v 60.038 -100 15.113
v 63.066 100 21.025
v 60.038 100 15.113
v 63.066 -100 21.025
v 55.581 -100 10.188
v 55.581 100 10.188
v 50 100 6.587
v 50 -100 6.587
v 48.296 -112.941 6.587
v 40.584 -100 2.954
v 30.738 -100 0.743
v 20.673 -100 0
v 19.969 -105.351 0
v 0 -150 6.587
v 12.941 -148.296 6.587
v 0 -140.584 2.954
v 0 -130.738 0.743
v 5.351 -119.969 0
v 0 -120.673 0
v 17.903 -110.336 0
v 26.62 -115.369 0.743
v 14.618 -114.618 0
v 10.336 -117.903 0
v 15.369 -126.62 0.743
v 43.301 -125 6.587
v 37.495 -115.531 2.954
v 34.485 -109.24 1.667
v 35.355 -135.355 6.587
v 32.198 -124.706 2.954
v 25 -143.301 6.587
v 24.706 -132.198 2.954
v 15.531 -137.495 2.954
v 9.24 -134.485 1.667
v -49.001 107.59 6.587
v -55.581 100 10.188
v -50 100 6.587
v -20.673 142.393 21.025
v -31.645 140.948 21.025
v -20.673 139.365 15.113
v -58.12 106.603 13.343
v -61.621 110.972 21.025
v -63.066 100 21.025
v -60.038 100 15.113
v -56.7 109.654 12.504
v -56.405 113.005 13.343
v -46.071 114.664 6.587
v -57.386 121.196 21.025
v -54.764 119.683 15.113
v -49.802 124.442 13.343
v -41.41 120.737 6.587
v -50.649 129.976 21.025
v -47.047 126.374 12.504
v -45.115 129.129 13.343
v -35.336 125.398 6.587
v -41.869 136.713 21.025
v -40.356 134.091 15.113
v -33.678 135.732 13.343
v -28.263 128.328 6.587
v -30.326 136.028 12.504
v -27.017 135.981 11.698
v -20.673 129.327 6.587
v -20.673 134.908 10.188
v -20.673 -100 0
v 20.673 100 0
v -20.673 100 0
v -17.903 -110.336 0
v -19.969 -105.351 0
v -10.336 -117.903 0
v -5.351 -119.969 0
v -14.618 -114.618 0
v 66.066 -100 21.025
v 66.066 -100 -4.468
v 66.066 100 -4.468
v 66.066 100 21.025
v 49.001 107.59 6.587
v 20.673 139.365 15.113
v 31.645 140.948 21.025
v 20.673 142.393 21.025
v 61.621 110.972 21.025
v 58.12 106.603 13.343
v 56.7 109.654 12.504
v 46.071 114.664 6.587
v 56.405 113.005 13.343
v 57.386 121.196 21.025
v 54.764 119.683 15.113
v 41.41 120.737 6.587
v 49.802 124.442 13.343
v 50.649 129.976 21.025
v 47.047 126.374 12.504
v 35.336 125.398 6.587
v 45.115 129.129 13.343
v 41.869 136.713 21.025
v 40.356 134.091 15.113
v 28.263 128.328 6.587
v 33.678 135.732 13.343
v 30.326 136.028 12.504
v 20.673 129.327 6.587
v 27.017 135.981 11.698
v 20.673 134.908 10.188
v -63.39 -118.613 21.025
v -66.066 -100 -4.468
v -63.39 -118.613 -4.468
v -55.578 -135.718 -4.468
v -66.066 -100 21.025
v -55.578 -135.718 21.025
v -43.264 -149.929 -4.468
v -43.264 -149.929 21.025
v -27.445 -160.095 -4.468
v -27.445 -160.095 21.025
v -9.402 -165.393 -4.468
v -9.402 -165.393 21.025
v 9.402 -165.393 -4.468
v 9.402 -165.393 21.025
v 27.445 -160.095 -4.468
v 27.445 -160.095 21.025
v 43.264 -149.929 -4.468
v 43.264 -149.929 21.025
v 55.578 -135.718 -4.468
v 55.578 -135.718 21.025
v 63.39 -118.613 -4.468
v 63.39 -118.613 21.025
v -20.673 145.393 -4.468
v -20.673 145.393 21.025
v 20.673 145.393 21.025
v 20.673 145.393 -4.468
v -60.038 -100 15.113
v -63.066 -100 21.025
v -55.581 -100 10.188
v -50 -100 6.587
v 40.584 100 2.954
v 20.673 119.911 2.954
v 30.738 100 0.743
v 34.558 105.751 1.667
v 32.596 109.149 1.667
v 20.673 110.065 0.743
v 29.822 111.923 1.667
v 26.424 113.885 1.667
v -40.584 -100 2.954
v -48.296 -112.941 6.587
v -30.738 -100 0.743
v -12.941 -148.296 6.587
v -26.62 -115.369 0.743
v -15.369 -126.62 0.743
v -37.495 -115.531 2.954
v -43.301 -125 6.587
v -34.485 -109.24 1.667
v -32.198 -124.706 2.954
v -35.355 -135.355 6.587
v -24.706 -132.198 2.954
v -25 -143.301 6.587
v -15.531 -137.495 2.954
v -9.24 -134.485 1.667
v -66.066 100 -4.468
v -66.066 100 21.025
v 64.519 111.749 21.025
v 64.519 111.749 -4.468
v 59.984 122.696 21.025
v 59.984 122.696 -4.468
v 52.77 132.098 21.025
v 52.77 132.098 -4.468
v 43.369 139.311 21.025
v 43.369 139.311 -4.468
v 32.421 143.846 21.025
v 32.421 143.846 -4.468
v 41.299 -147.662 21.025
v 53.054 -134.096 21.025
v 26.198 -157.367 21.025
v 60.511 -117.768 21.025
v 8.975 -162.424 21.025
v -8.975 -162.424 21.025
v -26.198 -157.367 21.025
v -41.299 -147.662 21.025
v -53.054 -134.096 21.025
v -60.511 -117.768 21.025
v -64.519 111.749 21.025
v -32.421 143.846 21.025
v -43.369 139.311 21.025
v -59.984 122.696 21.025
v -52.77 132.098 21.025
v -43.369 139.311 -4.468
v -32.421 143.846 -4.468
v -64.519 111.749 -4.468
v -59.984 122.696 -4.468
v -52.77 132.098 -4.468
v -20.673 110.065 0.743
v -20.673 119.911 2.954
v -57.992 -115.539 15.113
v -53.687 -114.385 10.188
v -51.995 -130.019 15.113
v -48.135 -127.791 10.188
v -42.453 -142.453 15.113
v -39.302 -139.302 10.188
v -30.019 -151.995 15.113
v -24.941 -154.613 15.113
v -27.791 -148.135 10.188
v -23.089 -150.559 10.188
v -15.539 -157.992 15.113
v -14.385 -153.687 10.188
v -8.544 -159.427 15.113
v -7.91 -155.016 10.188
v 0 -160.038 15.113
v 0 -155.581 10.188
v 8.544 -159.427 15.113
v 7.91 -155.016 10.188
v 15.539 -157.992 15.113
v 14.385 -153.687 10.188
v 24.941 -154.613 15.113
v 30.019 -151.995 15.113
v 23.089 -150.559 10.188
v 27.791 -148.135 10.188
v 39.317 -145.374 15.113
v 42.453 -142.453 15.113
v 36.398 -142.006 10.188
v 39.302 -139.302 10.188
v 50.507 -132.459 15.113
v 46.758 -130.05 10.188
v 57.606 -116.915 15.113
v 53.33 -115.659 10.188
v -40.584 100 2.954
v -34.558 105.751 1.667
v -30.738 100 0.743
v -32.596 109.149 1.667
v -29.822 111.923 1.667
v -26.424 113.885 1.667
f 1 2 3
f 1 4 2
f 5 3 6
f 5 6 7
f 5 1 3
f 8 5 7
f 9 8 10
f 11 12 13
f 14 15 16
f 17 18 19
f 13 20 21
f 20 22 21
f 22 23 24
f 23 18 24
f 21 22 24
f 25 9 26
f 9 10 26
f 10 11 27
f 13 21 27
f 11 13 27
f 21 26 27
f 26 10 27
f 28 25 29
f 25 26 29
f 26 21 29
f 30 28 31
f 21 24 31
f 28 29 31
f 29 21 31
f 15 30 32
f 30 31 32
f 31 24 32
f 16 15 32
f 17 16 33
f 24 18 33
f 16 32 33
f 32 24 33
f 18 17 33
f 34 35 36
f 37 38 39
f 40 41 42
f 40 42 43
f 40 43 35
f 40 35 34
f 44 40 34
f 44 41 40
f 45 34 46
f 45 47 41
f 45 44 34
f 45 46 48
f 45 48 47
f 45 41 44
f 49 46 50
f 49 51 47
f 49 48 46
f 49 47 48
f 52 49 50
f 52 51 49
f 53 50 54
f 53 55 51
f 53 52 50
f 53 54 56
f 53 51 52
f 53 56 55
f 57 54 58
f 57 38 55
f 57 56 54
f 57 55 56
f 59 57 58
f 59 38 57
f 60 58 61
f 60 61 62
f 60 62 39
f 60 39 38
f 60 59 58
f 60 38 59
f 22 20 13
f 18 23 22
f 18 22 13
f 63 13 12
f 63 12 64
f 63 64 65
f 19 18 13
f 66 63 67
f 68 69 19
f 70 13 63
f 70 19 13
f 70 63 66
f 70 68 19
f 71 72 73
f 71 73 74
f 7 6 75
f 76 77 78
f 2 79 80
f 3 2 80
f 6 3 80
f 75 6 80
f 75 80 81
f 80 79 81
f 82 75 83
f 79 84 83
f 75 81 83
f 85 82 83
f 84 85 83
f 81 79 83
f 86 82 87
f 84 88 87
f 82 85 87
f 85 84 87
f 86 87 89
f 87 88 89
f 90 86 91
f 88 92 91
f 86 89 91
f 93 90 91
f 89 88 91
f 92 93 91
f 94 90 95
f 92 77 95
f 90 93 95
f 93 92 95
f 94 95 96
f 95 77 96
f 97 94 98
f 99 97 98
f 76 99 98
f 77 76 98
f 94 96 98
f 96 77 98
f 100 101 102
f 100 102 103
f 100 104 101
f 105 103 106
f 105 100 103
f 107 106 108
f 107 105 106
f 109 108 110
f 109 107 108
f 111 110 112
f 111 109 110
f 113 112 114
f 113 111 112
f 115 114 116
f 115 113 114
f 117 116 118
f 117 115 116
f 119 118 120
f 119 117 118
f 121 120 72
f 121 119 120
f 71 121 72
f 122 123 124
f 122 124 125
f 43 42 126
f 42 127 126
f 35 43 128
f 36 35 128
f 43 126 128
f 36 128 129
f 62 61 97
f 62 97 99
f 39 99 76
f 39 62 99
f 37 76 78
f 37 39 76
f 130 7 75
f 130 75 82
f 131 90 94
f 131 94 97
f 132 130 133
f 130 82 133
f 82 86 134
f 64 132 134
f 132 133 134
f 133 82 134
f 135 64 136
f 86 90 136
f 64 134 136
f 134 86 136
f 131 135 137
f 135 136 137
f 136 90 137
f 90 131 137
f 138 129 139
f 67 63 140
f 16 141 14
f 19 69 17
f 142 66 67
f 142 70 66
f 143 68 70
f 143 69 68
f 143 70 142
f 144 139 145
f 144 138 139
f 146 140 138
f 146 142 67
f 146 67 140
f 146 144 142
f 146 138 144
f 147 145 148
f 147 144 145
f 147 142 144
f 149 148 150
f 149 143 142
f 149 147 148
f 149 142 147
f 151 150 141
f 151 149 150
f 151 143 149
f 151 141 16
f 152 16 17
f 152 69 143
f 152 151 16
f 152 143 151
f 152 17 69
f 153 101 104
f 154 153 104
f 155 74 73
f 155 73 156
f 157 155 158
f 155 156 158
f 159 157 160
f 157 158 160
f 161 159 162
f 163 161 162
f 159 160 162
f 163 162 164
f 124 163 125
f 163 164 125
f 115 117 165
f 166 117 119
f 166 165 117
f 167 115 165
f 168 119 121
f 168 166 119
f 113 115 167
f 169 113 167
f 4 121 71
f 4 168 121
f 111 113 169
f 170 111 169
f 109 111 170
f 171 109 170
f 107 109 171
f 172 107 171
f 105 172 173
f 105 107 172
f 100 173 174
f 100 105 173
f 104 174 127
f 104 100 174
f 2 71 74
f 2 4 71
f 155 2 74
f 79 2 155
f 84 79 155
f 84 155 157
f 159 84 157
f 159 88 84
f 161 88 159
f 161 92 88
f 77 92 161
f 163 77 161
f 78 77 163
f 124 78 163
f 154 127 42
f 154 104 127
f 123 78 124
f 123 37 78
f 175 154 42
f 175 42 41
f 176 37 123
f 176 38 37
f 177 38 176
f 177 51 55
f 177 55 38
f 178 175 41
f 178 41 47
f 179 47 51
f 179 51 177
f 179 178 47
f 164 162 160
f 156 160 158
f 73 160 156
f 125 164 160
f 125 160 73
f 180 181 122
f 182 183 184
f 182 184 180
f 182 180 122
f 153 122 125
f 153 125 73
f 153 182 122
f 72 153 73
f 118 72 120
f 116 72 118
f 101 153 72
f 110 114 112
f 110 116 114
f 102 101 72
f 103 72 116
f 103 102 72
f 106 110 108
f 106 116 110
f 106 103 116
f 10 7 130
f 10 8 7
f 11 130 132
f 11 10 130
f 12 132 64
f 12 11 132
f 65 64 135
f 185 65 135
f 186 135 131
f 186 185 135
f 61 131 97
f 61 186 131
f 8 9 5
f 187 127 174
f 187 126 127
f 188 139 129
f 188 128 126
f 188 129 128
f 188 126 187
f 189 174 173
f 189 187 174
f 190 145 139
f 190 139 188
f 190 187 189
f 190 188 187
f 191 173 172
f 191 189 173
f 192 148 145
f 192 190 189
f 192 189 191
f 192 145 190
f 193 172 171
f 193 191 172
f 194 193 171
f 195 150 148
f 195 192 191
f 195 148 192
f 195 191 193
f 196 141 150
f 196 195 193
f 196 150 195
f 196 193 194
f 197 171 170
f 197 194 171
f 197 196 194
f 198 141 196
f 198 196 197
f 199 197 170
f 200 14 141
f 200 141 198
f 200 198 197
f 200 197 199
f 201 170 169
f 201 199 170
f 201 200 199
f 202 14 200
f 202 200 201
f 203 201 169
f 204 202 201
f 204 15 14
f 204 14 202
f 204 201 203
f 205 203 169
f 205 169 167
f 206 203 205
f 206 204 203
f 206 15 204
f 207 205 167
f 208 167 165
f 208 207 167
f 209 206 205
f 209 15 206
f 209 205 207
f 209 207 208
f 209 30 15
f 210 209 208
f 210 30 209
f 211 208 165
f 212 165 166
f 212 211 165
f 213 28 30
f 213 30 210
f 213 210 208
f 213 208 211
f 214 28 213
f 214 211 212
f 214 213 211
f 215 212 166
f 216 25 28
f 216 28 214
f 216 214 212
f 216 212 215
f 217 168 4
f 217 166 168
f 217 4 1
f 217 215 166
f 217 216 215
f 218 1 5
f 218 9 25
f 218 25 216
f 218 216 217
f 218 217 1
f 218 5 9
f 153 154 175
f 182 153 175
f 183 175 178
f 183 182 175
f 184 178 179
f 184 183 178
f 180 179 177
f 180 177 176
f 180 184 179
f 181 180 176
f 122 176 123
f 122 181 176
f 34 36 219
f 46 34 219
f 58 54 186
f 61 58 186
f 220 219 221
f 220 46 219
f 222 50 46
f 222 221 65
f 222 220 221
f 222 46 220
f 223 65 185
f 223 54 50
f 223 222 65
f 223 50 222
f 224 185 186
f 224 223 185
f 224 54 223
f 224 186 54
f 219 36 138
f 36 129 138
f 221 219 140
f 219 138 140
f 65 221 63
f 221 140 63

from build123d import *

# Parameters (mm, degrees)
F1_DEPTH = 100
F2_ANGLE = 90
F4_ANGLE = 90
F5_DEPTH = 20.6729215554


with BuildPart() as f1:
    # F0 (on Front) → F1 (new body, symmetric)
    with BuildSketch(Plane.XZ):
        with BuildLine():
            ThreePointArc((50, 6.5869449865), (35.7017719302, 1.6669963579), (20.6729215554, 0))
            Line((20.6729215554, 0), (0, 0))
            Line((0, 0), (0, -4.4683294598))
            Line((0, -4.4683294598), (66.0657225847, -4.4683294598))
            Line((66.0657225847, -4.4683294598), (66.0657225847, 21.0250243545))
            Line((66.0657225847, 21.0250243545), (63.0657225847, 21.0250243545))
            ThreePointArc((63.0657225847, 21.0250243545), (57.9713766483, 12.5042019267), (50, 6.5869449865))
        make_face()
    extrude(amount=F1_DEPTH, both=True)

    # F1_face (on face) → F2 (revolve)
    with BuildSketch(Plane(origin=(44.1969490295, -100, 1.9928313496), x_dir=(1, 0, 0), z_dir=(0, -1, 0))):
        with BuildLine():
            Line((21.8687735552, -6.4611608094), (21.8687735552, 19.0321930048))
            Line((21.8687735552, 19.0321930048), (18.8687735552, 19.0321930048))
            ThreePointArc((18.8687735552, 19.0321930048), (13.7744276188, 10.511370577), (5.8030509705, 4.5941136369))
            ThreePointArc((5.8030509705, 4.5941136369), (-8.4951770993, -0.3258349918), (-23.5240274741, -1.9928313496))
            Line((-23.5240274741, -1.9928313496), (-44.1969490295, -1.9928313496))
            Line((-44.1969490295, -1.9928313496), (-44.1969490295, -6.4611608094))
            Line((-44.1969490295, -6.4611608094), (21.8687735552, -6.4611608094))
        make_face()
    revolve(axis=Axis((0, -100, -2.2341647299), (0, 0, -1)), revolution_arc=F2_ANGLE)

    # F3 (on face) → F4 (revolve)
    with BuildSketch(Plane(origin=(0, 100, 0), x_dir=(-1, 0, 0), z_dir=(0, 1, 0))):
        with BuildLine():
            Line((-63.0657225847, 21.0250243545), (-66.0657225847, 21.0250243545))
            Line((-66.0657225847, 21.0250243545), (-66.0657225847, -4.4683294598))
            Line((-66.0657225847, -4.4683294598), (-20.6729215554, -4.4683294598))
            Line((-20.6729215554, -4.4683294598), (-20.6729215554, 0))
            ThreePointArc((-20.6729215554, 0), (-35.7017719302, 1.6669963579), (-50, 6.5869449865))
            ThreePointArc((-50, 6.5869449865), (-57.9713766483, 12.5042019267), (-63.0657225847, 21.0250243545))
        make_face()
    revolve(axis=Axis((20.6729215554, 100, -2.2341647299), (0, 0, 1)), revolution_arc=F4_ANGLE)

    # F5 (add, through all): a face of the model
    f5_faces = [f1.faces().sort_by_distance(p)[0] for p in [
        (20.6729215554, 129.9863399133, 2.7995583272),
    ]]
    extrude(f5_faces, amount=F5_DEPTH)

    # F6: F1 across face


with BuildPart() as f1_1:
    add(f1.part)
    add(f1.part.mirror(Plane(origin=(0, -10.3364607777, 0.2594817433), x_dir=(0, -1, 0), z_dir=(-1, 0, 0))))


solid = f1_1.part
